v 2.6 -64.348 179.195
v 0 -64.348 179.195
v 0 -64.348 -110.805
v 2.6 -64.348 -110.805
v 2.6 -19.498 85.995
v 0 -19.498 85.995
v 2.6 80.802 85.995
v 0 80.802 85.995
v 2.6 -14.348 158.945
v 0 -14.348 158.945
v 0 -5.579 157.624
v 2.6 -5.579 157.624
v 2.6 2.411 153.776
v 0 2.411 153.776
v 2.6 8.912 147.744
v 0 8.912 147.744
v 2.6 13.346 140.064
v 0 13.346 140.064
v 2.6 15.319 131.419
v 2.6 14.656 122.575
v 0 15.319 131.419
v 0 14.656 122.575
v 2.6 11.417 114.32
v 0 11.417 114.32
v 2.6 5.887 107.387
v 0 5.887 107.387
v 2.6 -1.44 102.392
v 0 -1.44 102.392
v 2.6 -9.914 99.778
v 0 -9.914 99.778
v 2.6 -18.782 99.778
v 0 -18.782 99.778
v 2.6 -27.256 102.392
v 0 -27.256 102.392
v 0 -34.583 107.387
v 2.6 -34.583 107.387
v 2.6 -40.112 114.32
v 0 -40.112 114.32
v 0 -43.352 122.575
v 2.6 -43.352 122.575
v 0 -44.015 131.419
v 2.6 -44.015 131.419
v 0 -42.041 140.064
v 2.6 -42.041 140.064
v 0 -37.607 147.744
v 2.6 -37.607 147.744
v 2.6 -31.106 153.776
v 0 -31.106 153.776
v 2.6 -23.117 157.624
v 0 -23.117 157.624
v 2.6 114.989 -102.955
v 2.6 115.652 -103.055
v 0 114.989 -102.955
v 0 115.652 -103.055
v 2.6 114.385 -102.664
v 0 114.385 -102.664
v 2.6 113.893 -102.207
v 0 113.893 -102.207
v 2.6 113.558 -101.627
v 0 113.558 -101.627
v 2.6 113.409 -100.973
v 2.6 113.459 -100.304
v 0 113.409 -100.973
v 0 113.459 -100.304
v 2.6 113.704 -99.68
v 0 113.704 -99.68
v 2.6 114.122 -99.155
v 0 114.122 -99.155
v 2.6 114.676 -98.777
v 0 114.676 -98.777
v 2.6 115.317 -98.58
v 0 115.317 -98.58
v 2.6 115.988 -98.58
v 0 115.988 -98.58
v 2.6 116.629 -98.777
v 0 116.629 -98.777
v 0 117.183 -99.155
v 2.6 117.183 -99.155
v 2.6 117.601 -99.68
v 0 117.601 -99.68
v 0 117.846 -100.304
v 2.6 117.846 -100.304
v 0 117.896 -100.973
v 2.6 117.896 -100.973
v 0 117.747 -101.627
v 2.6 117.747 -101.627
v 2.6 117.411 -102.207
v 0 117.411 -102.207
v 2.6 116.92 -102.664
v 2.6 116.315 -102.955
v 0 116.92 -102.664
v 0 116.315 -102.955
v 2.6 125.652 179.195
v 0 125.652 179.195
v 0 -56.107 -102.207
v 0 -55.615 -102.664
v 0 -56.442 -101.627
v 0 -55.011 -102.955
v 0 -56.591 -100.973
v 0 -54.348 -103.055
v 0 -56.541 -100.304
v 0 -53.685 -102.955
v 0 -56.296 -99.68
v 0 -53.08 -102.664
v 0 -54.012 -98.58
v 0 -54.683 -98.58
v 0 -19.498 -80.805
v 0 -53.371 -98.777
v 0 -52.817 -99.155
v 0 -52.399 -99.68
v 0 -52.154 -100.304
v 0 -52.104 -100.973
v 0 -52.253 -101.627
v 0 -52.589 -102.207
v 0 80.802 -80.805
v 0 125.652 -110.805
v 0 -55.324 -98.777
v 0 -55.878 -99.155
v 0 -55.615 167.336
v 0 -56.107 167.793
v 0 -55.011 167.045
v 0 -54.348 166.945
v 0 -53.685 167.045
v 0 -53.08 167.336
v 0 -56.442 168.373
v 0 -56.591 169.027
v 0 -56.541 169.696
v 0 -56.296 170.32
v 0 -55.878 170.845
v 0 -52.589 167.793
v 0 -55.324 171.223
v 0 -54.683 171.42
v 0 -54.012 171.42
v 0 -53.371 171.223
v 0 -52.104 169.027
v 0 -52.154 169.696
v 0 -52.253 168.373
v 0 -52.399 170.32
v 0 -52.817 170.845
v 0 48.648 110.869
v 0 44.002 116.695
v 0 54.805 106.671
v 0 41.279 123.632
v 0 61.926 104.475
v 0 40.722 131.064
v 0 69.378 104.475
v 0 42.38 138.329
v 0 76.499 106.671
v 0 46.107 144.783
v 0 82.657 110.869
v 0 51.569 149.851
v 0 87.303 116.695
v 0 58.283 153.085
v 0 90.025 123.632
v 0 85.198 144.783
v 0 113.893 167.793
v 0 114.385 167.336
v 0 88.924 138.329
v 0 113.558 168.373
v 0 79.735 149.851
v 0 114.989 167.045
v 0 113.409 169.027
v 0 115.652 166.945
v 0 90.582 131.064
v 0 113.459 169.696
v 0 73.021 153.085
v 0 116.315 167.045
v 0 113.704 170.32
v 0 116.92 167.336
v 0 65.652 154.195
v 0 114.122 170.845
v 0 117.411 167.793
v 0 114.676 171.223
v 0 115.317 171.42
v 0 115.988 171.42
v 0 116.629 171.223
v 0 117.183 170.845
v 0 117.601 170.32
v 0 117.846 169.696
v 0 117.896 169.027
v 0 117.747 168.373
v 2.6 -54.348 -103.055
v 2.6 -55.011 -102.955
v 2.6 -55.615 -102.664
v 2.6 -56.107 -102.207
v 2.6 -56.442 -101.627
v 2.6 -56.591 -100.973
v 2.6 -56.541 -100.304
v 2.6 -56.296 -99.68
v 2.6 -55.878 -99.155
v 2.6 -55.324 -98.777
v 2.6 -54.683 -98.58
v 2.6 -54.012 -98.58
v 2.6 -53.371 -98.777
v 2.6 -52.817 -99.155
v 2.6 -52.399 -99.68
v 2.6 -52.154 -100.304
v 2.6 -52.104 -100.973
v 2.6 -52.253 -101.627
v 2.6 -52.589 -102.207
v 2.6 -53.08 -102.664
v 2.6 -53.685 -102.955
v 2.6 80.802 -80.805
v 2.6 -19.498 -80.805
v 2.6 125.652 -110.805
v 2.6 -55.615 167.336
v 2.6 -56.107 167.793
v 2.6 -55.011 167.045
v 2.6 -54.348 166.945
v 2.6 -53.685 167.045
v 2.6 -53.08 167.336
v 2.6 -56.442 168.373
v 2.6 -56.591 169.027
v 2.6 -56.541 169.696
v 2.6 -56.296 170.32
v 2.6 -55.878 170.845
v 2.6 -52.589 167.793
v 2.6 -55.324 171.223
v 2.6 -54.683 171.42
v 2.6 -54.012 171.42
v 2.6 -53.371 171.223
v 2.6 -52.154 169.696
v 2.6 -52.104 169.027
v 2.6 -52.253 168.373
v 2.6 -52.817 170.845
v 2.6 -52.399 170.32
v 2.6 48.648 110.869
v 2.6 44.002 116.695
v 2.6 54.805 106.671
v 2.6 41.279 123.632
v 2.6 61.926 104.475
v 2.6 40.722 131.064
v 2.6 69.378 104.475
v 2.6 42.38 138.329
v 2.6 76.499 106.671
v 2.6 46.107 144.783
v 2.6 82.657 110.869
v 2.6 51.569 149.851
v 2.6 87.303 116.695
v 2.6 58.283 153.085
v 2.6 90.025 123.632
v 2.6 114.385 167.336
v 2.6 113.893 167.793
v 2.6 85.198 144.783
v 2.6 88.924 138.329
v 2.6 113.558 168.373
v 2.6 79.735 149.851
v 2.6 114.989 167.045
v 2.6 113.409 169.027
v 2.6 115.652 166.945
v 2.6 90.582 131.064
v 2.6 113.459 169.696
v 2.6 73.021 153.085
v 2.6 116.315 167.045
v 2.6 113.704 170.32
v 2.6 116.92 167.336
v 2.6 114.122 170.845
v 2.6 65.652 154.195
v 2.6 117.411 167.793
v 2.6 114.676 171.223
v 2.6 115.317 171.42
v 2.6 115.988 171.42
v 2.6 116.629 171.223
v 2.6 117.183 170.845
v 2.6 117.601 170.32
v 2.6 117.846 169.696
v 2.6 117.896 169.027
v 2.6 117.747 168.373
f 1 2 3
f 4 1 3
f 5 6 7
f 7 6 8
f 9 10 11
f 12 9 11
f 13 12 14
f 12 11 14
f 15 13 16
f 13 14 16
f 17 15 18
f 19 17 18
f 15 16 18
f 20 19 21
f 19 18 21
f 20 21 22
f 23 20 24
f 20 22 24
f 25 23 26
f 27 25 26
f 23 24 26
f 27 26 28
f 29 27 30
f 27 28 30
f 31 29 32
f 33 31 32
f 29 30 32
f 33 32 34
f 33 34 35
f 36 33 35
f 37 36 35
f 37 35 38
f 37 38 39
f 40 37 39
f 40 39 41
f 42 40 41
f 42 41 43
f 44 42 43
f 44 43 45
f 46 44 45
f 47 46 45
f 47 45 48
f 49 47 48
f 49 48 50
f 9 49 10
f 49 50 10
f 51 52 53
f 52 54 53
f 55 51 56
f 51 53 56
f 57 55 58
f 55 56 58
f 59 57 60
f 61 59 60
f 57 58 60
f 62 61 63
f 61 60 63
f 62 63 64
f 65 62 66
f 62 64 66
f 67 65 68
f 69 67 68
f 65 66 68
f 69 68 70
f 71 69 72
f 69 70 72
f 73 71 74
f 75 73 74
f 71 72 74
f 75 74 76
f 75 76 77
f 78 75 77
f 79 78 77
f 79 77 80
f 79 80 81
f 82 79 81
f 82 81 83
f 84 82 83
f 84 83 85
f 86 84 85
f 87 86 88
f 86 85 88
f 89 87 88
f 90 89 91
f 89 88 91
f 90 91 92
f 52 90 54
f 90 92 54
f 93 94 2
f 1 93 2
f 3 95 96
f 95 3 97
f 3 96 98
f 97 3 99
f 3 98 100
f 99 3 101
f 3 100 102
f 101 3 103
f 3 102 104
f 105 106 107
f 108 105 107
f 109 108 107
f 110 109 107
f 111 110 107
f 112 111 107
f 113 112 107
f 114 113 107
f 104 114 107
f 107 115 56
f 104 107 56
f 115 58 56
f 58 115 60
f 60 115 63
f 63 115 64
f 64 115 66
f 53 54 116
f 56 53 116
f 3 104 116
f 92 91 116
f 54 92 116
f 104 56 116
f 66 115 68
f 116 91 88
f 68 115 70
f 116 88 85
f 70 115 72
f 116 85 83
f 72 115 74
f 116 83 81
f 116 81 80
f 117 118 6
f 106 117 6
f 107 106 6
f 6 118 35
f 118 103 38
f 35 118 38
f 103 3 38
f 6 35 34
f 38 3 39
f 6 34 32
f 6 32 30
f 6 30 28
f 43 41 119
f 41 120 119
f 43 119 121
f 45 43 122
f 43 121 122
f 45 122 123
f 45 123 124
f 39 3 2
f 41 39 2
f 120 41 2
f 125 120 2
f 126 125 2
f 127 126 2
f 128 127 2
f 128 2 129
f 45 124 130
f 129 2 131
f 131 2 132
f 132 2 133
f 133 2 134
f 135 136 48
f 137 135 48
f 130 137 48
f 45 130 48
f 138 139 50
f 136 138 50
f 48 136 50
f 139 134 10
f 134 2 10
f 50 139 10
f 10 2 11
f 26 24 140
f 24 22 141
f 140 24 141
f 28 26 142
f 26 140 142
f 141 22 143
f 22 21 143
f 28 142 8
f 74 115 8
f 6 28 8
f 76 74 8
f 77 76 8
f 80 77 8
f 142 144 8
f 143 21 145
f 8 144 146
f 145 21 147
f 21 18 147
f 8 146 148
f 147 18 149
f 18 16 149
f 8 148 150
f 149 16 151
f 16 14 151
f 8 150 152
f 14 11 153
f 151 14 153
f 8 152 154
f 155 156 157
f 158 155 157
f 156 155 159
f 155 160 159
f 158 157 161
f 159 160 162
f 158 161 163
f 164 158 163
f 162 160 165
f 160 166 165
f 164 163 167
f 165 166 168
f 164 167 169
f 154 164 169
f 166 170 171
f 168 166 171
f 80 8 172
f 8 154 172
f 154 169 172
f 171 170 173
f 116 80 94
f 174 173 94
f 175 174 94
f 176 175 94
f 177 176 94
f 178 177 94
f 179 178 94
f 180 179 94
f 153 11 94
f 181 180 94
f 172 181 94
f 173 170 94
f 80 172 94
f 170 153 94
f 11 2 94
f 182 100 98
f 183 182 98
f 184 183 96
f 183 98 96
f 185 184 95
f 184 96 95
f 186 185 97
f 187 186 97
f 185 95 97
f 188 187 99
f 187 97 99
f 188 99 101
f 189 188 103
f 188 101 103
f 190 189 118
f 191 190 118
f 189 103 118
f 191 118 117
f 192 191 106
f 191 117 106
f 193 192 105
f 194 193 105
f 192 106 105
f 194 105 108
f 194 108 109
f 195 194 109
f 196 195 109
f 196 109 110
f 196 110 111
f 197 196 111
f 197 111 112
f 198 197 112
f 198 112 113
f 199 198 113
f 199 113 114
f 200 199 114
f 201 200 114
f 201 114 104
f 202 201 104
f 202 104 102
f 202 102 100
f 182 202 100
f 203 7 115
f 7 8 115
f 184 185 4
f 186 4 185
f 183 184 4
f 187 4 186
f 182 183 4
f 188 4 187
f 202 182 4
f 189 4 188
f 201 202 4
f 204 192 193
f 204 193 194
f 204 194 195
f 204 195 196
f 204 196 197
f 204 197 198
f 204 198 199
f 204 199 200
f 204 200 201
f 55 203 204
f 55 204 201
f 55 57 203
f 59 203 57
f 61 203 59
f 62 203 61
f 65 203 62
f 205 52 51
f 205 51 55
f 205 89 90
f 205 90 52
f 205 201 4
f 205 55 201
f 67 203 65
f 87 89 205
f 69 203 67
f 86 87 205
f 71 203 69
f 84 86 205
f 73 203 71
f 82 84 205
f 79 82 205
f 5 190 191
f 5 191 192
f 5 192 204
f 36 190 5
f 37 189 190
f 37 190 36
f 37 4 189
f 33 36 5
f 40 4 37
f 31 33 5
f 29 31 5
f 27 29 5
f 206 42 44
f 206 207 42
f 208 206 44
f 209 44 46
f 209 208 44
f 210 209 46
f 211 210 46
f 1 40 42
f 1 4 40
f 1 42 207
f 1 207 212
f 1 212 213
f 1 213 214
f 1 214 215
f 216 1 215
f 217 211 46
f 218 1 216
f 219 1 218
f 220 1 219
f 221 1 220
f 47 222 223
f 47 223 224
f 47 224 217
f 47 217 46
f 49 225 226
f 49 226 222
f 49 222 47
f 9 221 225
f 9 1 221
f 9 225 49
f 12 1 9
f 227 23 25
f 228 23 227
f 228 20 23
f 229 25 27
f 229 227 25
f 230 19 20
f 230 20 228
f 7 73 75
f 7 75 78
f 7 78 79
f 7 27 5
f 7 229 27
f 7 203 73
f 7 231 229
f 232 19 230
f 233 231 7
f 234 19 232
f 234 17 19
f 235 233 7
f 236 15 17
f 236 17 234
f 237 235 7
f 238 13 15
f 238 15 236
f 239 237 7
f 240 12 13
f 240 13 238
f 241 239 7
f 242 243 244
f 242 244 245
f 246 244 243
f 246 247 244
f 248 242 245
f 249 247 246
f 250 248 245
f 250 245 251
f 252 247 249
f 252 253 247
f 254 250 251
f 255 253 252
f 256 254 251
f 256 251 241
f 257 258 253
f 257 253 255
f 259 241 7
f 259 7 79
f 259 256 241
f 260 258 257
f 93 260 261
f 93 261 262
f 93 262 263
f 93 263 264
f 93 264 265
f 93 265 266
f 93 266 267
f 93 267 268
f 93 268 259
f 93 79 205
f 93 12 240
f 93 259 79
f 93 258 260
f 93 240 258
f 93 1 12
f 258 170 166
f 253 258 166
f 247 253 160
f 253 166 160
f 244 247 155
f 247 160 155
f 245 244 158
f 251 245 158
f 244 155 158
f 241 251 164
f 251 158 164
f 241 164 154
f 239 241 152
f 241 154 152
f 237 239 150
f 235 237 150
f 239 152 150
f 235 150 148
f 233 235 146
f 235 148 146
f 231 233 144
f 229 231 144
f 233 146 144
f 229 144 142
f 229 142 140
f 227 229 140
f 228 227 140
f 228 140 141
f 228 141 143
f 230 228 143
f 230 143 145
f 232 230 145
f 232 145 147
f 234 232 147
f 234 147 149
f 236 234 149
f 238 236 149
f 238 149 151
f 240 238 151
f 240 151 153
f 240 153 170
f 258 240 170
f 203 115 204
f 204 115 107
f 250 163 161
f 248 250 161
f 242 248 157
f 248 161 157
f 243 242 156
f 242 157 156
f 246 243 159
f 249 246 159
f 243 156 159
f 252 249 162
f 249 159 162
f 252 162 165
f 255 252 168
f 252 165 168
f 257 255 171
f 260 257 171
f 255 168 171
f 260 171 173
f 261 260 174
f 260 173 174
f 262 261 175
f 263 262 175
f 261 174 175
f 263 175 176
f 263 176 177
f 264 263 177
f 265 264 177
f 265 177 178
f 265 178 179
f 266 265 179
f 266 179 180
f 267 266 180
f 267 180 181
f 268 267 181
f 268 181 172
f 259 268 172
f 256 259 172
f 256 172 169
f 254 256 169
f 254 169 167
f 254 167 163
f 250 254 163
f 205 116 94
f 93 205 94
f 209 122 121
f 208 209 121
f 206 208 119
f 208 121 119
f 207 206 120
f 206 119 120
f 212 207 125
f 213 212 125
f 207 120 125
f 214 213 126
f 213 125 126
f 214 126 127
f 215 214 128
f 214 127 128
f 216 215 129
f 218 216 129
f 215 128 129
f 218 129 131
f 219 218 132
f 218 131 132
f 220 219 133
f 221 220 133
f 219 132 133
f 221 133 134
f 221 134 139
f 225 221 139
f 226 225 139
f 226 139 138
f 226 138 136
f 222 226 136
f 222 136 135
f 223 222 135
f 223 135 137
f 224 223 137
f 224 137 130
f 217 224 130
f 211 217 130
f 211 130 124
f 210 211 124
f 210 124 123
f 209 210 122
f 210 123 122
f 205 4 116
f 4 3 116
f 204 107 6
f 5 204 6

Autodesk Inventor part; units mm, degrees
ref_plane "YZ Plane" through (0, 0, 0) normal (1, 0, 0) x (0, 1, 0)
ref_plane "XZ Plane" through (0, 0, 0) normal (0, 1, 0) x (-1, 0, 0)
ref_plane "XY Plane" through (0, 0, 0) normal (0, 0, 1) x (1, 0, 0)
sketch "スケッチ1" plane through (0, 0, 0) normal (1, 0, 0) x (0, 1, 0)
  line L0 (125.6523, 179.1954) -> (-64.3477, 179.1954)
  line L1 (-64.3477, 179.1954) -> (-64.3477, -110.8046)
  line L2 (-64.3477, -110.8046) -> (125.6523, -110.8046)
  line L3 (125.6523, -110.8046) -> (125.6523, 179.1954)
  point P0 (0, 0)
  dimension "d0" = 190
  dimension "d1" = 290
extrude "押し出し1" add sketch "スケッチ1" along normal blind 2.6
sketch "スケッチ2" plane through (2.6, 0, 0) normal (1, 0, 0) x (0, 0, -1)
  line L0 (-179.1954, 125.6523) -> (-179.1954, -64.3477) projected
  line L1 (-179.1954, -64.3477) -> (110.8046, -64.3477) projected
  line L2 (110.8046, -64.3477) -> (110.8046, 125.6523) projected
  line L3 (110.8046, 125.6523) -> (-179.1954, 125.6523) projected
  line L4 (-34.1954, 30.6523) -> (-34.1954, 125.6523)
  line L5 (110.8046, 125.6523) -> (-179.1954, 125.6523) projected
  line L6 (-34.1954, 30.6523) -> (110.8046, 30.6523)
  point P0 (0, 0)
  point P1 (-169.1954, 115.6523)
  point P2 (100.8046, 115.6523)
  point P3 (-169.1954, -54.3477)
  point P4 (100.8046, -54.3477)
  dimension "d4" = 10
  dimension "d5" = 10
hole "穴1" at (2.6, 115.6523, 169.1954) at (2.6, 115.6523, -100.8046) at (2.6, -54.3477, 169.1954) at (2.6, -54.3477, -100.8046) direction (-1, 0, 0) diameter 4.5 depth 10 tip angle 118
sketch "スケッチ6" plane through (0, 0, 0) normal (-1, 0, 0) x (0, 0, 1)
  circle A0 centre (129.1954, -14.3477) radius 29.75 projected
  circle A1 centre (129.1954, 65.6523) radius 25 projected
  line L0 (-80.8046, -19.4977) -> (85.9954, -19.4977) projected
  line L1 (85.9954, -19.4977) -> (85.9954, 80.8023) projected
  line L2 (85.9954, 80.8023) -> (-80.8046, 80.8023) projected
  line L3 (-80.8046, 80.8023) -> (-80.8046, -19.4977) projected
  point P0 (0, 0)
extrude "押し出し5" cut sketch "スケッチ6" against normal up to surface (2.6 mm away)
properties part number "lc_box_side" material "ポリカーボネート、クリア"
